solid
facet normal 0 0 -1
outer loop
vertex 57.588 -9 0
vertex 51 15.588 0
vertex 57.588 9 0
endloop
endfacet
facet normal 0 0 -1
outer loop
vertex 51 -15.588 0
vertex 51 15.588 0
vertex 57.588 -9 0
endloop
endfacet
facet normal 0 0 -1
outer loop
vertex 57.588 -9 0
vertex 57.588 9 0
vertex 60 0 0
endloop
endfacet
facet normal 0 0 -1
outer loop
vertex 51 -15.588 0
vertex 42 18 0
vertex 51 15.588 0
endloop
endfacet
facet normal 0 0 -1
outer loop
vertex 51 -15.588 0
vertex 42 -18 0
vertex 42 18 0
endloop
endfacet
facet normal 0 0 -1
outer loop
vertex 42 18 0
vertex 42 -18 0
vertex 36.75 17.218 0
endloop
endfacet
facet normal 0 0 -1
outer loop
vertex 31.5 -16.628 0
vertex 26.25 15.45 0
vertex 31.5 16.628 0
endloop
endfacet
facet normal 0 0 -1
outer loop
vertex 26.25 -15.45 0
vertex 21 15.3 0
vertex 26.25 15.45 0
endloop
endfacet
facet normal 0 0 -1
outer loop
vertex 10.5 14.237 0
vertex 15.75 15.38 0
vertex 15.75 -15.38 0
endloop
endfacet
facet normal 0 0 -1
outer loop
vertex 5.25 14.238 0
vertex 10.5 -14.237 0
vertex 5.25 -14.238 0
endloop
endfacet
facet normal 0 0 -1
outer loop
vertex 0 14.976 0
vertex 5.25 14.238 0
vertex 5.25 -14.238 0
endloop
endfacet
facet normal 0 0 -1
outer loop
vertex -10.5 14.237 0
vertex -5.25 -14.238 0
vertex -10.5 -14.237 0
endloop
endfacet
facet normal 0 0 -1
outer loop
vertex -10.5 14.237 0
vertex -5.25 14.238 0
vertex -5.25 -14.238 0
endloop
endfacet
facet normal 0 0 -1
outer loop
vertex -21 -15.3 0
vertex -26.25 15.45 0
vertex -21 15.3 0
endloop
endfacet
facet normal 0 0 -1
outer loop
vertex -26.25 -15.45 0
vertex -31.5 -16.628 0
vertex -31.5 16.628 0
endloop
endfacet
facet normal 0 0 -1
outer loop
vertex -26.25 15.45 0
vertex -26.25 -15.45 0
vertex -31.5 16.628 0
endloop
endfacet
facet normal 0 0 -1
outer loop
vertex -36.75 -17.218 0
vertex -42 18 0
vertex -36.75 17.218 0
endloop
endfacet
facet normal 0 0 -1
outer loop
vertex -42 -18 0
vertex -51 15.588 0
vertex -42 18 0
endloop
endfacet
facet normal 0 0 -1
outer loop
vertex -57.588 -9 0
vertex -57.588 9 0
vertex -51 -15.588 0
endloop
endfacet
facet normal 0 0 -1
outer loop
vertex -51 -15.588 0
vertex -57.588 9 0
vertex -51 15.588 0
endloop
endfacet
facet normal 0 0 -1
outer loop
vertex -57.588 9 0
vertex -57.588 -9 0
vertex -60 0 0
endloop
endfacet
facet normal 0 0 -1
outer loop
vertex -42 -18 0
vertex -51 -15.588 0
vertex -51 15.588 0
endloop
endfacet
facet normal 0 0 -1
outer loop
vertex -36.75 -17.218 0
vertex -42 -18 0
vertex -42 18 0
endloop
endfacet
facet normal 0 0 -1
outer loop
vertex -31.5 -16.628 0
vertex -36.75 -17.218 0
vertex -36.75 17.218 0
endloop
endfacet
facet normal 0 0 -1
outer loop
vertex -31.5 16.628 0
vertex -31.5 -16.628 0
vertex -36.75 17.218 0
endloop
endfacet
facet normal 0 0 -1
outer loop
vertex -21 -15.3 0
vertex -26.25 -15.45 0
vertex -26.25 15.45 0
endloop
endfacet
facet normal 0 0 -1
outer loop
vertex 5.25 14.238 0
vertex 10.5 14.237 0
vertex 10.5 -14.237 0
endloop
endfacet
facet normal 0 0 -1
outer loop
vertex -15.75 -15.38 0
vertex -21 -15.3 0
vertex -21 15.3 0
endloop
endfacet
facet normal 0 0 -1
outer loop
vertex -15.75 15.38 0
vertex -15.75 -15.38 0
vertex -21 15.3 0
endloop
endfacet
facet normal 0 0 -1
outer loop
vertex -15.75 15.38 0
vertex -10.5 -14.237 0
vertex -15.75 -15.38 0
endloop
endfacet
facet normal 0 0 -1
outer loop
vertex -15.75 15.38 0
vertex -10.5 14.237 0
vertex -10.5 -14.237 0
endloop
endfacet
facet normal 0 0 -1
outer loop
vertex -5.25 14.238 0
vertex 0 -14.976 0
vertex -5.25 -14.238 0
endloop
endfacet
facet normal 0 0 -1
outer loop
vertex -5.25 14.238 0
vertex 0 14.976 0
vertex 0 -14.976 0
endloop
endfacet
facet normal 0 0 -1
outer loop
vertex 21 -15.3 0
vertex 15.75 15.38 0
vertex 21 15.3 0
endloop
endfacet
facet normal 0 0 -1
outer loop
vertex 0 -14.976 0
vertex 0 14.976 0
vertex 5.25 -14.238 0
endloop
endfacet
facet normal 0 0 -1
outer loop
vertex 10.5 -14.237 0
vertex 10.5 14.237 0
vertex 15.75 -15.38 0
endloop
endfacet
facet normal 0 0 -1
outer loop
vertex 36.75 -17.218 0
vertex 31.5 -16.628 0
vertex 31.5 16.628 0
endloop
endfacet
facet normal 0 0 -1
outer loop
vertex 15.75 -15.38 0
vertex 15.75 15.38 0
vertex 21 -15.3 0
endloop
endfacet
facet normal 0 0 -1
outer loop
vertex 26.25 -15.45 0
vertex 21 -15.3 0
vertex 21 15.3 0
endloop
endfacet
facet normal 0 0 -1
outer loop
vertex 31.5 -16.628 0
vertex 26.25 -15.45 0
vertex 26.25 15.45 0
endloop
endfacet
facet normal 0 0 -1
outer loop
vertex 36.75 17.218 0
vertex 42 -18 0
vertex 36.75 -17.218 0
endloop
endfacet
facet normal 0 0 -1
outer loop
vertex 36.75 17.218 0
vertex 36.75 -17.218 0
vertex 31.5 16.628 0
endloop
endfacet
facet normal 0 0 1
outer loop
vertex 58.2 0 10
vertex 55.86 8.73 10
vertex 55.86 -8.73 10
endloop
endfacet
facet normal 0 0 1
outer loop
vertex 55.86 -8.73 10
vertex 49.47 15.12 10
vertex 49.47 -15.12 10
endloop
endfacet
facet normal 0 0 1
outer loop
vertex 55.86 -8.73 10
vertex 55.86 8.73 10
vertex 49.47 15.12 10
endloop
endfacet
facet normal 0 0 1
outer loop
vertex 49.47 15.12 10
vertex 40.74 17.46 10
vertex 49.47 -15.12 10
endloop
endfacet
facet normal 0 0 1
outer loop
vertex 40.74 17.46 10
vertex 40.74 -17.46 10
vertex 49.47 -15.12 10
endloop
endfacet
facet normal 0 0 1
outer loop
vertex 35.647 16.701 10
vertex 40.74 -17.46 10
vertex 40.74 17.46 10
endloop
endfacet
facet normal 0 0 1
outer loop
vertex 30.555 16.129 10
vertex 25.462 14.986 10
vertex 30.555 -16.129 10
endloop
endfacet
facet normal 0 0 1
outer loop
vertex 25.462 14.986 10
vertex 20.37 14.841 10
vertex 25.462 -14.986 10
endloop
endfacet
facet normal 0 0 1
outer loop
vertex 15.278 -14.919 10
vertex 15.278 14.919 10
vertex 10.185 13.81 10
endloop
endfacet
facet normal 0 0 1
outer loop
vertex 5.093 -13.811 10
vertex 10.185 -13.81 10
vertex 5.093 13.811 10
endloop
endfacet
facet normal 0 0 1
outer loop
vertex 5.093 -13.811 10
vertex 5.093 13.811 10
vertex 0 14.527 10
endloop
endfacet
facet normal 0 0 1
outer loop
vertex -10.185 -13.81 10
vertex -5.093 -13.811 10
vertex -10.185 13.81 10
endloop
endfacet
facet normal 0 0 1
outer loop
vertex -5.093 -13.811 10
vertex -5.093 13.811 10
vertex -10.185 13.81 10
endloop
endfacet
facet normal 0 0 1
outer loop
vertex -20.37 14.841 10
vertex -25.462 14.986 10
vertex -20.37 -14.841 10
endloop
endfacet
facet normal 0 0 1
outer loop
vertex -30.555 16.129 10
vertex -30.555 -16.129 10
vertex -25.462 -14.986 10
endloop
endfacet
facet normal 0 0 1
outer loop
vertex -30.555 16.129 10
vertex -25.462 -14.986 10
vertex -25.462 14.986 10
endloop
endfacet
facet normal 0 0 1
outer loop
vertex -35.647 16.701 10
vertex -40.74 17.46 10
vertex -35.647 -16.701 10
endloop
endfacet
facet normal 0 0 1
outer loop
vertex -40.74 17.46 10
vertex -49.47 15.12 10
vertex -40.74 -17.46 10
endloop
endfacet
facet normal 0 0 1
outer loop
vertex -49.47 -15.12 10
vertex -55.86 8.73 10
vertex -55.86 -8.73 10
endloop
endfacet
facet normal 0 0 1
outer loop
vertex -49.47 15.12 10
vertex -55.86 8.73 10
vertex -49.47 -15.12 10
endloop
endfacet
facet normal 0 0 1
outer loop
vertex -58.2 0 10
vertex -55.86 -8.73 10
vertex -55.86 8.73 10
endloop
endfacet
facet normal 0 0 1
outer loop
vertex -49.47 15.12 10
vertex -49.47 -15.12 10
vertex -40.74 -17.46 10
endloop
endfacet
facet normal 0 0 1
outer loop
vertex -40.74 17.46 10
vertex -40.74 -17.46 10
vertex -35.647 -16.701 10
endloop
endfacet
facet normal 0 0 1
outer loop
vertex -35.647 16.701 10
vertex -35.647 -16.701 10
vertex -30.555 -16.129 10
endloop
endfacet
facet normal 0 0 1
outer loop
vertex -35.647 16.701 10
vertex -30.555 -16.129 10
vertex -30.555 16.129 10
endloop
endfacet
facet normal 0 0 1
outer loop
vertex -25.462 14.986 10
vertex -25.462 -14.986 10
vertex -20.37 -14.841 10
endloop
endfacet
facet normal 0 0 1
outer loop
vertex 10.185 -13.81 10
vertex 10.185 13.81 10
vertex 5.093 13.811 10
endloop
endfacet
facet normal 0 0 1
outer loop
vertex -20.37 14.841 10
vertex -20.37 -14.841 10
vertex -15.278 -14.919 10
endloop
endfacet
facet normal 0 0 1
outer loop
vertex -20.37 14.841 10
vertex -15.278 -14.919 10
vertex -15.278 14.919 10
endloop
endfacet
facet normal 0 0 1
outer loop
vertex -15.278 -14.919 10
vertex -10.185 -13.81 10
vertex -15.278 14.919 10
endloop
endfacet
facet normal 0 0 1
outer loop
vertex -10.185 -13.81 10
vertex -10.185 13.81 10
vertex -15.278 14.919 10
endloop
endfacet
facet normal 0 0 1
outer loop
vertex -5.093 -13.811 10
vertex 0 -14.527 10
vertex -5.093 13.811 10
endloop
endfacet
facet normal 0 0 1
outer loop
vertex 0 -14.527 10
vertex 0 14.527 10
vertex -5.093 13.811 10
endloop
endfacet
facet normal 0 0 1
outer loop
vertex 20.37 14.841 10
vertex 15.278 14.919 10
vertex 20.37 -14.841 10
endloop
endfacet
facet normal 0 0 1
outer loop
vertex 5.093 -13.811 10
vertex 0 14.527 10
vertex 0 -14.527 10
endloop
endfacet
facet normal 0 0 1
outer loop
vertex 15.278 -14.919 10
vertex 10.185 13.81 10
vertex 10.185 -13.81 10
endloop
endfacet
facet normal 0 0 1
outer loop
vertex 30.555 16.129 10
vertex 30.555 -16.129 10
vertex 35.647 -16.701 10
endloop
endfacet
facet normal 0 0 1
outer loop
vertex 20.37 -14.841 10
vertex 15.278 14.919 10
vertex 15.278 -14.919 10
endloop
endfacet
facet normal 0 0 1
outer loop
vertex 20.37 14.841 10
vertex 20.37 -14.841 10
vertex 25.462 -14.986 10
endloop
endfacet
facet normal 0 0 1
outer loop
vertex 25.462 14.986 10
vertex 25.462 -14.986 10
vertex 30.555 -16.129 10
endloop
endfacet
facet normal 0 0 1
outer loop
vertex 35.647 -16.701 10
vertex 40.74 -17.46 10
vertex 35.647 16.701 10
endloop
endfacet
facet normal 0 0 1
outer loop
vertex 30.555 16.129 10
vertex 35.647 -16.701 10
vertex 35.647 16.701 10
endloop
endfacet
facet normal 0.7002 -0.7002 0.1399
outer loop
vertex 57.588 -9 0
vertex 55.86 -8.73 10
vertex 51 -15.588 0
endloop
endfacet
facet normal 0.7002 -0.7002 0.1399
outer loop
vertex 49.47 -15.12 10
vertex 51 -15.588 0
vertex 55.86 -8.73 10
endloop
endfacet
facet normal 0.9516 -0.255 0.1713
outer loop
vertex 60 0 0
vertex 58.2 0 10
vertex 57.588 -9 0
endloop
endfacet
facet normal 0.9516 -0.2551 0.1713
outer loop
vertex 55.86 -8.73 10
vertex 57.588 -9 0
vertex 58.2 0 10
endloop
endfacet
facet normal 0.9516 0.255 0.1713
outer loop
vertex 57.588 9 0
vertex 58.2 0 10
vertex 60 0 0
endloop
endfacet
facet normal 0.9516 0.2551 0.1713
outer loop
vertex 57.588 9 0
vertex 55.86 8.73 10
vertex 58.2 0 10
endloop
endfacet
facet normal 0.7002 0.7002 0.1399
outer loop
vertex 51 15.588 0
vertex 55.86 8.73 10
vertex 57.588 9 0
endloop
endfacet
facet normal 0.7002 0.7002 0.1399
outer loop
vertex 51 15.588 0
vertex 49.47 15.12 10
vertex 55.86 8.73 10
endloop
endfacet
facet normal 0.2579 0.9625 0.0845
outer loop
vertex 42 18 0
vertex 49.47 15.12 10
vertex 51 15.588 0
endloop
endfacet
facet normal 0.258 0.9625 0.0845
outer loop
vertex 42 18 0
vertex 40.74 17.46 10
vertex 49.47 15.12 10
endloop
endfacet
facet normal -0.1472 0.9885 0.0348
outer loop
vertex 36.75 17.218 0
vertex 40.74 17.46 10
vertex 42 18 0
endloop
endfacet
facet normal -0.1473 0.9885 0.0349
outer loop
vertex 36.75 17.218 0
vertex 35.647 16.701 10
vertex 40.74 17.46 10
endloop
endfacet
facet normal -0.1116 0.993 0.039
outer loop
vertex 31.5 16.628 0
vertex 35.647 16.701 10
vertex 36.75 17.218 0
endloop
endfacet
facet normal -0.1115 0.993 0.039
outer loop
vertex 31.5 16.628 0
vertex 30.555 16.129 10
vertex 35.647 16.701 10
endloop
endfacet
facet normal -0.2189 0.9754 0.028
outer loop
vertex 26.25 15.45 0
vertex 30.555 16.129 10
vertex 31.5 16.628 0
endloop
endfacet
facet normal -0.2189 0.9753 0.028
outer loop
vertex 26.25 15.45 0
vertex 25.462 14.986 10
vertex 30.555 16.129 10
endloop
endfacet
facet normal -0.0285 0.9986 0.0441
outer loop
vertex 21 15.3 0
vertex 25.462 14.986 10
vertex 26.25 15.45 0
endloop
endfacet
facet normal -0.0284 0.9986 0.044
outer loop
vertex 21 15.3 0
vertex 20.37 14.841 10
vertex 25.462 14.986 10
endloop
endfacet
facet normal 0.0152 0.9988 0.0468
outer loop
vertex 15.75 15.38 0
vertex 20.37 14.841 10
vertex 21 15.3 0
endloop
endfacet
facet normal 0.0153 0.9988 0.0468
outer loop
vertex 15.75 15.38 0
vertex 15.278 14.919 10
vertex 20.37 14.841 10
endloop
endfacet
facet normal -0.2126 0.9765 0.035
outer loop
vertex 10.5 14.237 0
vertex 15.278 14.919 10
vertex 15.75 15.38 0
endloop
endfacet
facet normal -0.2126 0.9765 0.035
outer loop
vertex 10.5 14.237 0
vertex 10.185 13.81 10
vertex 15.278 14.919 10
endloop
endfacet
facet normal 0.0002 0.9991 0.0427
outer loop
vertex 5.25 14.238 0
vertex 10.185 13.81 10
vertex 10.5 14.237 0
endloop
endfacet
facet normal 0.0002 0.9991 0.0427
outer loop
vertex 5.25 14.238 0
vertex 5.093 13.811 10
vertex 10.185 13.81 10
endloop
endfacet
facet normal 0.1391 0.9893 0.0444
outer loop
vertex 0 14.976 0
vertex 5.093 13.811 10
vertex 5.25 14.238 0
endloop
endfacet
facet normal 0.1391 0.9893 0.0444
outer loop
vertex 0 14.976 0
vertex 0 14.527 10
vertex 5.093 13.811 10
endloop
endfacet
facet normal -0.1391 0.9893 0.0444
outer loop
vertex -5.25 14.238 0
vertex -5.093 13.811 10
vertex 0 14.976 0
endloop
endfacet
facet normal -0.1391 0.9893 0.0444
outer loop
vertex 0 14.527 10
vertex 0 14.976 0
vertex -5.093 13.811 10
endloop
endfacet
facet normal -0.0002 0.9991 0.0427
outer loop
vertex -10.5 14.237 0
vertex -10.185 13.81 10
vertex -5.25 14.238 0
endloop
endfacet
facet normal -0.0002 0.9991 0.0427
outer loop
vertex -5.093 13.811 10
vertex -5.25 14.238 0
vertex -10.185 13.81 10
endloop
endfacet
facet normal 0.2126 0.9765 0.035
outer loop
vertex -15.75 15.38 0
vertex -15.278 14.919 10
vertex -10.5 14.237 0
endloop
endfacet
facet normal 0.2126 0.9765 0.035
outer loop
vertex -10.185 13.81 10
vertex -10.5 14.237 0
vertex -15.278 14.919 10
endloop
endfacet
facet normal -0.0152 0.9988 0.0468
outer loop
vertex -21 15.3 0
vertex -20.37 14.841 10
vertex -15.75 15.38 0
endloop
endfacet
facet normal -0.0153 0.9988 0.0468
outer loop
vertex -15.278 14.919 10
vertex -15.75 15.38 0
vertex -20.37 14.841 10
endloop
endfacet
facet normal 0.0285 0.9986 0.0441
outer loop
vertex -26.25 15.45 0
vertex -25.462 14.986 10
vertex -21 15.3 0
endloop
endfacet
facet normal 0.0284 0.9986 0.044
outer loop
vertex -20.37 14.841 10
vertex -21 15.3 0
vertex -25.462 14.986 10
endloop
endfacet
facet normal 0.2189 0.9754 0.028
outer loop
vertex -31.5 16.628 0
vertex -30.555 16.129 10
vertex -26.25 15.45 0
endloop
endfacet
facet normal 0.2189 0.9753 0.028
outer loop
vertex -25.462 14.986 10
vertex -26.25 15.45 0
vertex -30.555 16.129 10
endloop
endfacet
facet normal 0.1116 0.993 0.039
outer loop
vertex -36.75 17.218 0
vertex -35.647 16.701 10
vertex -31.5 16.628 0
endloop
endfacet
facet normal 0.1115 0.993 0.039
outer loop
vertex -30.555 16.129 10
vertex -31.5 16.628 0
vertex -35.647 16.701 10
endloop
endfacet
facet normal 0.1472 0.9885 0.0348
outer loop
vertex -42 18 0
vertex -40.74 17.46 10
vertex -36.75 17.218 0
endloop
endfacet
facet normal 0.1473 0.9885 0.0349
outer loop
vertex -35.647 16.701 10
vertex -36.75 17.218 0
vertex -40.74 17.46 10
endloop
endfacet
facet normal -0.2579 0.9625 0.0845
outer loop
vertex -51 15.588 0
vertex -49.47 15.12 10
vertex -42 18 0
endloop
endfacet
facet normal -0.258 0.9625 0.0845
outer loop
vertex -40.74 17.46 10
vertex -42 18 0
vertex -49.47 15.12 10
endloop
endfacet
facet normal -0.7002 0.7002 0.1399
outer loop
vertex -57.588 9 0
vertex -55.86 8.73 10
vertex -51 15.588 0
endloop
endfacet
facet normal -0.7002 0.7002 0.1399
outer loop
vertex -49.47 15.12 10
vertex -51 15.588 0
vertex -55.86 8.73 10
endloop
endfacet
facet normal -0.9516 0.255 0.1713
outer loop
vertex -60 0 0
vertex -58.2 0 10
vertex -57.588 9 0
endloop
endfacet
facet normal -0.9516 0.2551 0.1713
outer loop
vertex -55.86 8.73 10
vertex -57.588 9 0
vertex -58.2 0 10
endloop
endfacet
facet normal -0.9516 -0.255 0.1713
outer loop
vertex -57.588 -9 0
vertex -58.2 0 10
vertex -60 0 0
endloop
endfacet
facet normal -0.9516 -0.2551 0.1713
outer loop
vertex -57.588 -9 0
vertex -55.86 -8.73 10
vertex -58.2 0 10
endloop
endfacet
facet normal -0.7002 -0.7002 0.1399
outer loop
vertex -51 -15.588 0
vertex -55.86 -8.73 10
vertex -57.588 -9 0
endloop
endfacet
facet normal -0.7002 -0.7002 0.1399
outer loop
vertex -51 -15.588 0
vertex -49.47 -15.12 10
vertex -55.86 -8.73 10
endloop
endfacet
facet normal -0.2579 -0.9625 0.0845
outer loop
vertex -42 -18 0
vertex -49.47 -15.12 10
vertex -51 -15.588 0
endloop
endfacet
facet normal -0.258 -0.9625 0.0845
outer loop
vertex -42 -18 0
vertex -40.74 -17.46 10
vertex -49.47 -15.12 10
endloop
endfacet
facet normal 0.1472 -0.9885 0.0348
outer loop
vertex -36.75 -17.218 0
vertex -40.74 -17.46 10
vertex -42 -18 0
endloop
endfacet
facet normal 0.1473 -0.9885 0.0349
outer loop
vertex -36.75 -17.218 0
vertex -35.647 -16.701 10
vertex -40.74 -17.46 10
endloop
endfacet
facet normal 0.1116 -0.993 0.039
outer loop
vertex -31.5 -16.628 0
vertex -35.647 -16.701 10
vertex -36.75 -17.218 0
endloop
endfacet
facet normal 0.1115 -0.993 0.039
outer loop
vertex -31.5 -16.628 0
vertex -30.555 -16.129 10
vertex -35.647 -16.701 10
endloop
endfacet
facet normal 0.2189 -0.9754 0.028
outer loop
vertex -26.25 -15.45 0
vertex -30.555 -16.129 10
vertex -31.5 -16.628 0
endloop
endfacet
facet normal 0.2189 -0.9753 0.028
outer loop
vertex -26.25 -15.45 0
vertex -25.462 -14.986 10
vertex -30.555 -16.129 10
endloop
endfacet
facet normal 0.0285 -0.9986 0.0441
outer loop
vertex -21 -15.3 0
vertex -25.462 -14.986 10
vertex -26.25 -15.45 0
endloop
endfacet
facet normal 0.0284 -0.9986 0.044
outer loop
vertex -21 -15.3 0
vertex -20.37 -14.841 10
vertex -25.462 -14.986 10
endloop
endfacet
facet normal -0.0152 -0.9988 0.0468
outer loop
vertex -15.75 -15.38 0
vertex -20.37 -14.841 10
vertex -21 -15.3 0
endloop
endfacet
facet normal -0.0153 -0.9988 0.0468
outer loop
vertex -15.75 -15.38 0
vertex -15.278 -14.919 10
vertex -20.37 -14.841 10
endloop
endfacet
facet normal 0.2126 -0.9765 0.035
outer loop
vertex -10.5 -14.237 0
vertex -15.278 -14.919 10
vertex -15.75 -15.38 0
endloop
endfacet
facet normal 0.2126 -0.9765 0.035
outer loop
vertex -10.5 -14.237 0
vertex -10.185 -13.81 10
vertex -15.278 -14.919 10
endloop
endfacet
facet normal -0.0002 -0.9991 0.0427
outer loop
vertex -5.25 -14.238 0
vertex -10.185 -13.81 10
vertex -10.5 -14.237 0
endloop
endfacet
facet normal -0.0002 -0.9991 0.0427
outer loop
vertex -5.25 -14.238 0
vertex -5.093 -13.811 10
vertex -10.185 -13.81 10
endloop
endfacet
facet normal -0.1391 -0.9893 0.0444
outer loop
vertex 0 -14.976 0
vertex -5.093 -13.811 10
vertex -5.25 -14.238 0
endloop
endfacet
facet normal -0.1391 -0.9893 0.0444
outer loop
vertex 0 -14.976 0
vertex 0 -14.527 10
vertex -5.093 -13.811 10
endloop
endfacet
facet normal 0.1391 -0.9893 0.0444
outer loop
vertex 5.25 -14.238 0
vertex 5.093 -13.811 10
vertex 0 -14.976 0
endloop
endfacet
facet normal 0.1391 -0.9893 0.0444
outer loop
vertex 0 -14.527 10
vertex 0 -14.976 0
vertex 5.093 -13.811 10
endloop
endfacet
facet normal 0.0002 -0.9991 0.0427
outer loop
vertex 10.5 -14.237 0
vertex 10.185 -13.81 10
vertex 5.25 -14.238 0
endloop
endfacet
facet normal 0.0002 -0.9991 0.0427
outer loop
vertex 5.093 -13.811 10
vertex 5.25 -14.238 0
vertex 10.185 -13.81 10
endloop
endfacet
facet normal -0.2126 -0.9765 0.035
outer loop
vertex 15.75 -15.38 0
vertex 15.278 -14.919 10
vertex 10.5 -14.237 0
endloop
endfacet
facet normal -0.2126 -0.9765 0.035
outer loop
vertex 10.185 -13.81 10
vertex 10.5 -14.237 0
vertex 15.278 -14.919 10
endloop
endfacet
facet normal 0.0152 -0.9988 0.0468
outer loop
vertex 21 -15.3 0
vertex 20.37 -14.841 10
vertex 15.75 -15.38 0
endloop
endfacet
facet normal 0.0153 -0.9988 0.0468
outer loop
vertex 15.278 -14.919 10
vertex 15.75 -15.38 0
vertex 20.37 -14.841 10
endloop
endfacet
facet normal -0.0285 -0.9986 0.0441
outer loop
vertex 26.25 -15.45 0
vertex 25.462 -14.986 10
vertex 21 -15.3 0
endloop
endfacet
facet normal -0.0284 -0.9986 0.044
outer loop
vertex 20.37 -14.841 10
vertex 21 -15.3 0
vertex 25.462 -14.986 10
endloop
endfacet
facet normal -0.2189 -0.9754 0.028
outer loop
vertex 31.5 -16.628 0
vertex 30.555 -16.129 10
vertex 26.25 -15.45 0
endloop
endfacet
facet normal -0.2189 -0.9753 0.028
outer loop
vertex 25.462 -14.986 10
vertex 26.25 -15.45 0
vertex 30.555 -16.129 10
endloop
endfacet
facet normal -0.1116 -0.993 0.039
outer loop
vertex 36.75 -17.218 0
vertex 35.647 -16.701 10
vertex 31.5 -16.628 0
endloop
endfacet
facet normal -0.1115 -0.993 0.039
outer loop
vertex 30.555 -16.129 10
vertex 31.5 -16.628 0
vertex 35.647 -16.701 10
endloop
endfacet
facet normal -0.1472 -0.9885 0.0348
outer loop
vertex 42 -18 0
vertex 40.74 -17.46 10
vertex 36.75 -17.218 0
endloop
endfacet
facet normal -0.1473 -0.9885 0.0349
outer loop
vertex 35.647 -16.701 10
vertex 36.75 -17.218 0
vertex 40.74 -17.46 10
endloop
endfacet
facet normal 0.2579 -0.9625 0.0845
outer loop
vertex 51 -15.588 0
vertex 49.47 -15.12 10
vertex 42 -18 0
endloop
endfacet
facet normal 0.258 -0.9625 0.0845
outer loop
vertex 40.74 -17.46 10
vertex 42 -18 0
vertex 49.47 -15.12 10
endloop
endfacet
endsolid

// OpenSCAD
$fn = 32;

// ----------------------------------------------------------------------
// Handle: 120 x 36 mm grip, 10 mm thick
// ----------------------------------------------------------------------

// --- parameters (mm) ---
length = 120;             // grip length
width = 36;               // grip width
thickness = 10;           // grip thickness
waist = 0.8;              // width factor at the middle
draft = 0.97;             // top face scale of the extrusion
scallops = 5;             // finger rests per side
ripple = 0.04;            // depth factor of the finger rests

/* ergonomic grip outline, closed spline-like polygon in the XY plane */
grip = [[-42, 18], [-36.75, 17.218], [-31.5, 16.628], [-26.25, 15.45], [-21, 15.3], [-15.75, 15.38], [-10.5, 14.237], [-5.25, 14.238], [0, 14.976], [5.25, 14.238], [10.5, 14.237], [15.75, 15.38], [21, 15.3], [26.25, 15.45], [31.5, 16.628], [36.75, 17.218], [42, 18], [51, 15.588], [57.588, 9], [60, 0], [57.588, -9], [51, -15.588], [42, -18], [42, -18], [36.75, -17.218], [31.5, -16.628], [26.25, -15.45], [21, -15.3], [15.75, -15.38], [10.5, -14.237], [5.25, -14.238], [0, -14.976], [-5.25, -14.238], [-10.5, -14.237], [-15.75, -15.38], [-21, -15.3], [-26.25, -15.45], [-31.5, -16.628], [-36.75, -17.218], [-42, -18], [-51, -15.588], [-57.588, -9], [-60, 0], [-57.588, 9], [-51, 15.588], [-42, 18]];

module grip_body() {
  linear_extrude(height = thickness, scale = draft) polygon(grip);
}

difference() {
  union() {
    grip_body();
  }
}
